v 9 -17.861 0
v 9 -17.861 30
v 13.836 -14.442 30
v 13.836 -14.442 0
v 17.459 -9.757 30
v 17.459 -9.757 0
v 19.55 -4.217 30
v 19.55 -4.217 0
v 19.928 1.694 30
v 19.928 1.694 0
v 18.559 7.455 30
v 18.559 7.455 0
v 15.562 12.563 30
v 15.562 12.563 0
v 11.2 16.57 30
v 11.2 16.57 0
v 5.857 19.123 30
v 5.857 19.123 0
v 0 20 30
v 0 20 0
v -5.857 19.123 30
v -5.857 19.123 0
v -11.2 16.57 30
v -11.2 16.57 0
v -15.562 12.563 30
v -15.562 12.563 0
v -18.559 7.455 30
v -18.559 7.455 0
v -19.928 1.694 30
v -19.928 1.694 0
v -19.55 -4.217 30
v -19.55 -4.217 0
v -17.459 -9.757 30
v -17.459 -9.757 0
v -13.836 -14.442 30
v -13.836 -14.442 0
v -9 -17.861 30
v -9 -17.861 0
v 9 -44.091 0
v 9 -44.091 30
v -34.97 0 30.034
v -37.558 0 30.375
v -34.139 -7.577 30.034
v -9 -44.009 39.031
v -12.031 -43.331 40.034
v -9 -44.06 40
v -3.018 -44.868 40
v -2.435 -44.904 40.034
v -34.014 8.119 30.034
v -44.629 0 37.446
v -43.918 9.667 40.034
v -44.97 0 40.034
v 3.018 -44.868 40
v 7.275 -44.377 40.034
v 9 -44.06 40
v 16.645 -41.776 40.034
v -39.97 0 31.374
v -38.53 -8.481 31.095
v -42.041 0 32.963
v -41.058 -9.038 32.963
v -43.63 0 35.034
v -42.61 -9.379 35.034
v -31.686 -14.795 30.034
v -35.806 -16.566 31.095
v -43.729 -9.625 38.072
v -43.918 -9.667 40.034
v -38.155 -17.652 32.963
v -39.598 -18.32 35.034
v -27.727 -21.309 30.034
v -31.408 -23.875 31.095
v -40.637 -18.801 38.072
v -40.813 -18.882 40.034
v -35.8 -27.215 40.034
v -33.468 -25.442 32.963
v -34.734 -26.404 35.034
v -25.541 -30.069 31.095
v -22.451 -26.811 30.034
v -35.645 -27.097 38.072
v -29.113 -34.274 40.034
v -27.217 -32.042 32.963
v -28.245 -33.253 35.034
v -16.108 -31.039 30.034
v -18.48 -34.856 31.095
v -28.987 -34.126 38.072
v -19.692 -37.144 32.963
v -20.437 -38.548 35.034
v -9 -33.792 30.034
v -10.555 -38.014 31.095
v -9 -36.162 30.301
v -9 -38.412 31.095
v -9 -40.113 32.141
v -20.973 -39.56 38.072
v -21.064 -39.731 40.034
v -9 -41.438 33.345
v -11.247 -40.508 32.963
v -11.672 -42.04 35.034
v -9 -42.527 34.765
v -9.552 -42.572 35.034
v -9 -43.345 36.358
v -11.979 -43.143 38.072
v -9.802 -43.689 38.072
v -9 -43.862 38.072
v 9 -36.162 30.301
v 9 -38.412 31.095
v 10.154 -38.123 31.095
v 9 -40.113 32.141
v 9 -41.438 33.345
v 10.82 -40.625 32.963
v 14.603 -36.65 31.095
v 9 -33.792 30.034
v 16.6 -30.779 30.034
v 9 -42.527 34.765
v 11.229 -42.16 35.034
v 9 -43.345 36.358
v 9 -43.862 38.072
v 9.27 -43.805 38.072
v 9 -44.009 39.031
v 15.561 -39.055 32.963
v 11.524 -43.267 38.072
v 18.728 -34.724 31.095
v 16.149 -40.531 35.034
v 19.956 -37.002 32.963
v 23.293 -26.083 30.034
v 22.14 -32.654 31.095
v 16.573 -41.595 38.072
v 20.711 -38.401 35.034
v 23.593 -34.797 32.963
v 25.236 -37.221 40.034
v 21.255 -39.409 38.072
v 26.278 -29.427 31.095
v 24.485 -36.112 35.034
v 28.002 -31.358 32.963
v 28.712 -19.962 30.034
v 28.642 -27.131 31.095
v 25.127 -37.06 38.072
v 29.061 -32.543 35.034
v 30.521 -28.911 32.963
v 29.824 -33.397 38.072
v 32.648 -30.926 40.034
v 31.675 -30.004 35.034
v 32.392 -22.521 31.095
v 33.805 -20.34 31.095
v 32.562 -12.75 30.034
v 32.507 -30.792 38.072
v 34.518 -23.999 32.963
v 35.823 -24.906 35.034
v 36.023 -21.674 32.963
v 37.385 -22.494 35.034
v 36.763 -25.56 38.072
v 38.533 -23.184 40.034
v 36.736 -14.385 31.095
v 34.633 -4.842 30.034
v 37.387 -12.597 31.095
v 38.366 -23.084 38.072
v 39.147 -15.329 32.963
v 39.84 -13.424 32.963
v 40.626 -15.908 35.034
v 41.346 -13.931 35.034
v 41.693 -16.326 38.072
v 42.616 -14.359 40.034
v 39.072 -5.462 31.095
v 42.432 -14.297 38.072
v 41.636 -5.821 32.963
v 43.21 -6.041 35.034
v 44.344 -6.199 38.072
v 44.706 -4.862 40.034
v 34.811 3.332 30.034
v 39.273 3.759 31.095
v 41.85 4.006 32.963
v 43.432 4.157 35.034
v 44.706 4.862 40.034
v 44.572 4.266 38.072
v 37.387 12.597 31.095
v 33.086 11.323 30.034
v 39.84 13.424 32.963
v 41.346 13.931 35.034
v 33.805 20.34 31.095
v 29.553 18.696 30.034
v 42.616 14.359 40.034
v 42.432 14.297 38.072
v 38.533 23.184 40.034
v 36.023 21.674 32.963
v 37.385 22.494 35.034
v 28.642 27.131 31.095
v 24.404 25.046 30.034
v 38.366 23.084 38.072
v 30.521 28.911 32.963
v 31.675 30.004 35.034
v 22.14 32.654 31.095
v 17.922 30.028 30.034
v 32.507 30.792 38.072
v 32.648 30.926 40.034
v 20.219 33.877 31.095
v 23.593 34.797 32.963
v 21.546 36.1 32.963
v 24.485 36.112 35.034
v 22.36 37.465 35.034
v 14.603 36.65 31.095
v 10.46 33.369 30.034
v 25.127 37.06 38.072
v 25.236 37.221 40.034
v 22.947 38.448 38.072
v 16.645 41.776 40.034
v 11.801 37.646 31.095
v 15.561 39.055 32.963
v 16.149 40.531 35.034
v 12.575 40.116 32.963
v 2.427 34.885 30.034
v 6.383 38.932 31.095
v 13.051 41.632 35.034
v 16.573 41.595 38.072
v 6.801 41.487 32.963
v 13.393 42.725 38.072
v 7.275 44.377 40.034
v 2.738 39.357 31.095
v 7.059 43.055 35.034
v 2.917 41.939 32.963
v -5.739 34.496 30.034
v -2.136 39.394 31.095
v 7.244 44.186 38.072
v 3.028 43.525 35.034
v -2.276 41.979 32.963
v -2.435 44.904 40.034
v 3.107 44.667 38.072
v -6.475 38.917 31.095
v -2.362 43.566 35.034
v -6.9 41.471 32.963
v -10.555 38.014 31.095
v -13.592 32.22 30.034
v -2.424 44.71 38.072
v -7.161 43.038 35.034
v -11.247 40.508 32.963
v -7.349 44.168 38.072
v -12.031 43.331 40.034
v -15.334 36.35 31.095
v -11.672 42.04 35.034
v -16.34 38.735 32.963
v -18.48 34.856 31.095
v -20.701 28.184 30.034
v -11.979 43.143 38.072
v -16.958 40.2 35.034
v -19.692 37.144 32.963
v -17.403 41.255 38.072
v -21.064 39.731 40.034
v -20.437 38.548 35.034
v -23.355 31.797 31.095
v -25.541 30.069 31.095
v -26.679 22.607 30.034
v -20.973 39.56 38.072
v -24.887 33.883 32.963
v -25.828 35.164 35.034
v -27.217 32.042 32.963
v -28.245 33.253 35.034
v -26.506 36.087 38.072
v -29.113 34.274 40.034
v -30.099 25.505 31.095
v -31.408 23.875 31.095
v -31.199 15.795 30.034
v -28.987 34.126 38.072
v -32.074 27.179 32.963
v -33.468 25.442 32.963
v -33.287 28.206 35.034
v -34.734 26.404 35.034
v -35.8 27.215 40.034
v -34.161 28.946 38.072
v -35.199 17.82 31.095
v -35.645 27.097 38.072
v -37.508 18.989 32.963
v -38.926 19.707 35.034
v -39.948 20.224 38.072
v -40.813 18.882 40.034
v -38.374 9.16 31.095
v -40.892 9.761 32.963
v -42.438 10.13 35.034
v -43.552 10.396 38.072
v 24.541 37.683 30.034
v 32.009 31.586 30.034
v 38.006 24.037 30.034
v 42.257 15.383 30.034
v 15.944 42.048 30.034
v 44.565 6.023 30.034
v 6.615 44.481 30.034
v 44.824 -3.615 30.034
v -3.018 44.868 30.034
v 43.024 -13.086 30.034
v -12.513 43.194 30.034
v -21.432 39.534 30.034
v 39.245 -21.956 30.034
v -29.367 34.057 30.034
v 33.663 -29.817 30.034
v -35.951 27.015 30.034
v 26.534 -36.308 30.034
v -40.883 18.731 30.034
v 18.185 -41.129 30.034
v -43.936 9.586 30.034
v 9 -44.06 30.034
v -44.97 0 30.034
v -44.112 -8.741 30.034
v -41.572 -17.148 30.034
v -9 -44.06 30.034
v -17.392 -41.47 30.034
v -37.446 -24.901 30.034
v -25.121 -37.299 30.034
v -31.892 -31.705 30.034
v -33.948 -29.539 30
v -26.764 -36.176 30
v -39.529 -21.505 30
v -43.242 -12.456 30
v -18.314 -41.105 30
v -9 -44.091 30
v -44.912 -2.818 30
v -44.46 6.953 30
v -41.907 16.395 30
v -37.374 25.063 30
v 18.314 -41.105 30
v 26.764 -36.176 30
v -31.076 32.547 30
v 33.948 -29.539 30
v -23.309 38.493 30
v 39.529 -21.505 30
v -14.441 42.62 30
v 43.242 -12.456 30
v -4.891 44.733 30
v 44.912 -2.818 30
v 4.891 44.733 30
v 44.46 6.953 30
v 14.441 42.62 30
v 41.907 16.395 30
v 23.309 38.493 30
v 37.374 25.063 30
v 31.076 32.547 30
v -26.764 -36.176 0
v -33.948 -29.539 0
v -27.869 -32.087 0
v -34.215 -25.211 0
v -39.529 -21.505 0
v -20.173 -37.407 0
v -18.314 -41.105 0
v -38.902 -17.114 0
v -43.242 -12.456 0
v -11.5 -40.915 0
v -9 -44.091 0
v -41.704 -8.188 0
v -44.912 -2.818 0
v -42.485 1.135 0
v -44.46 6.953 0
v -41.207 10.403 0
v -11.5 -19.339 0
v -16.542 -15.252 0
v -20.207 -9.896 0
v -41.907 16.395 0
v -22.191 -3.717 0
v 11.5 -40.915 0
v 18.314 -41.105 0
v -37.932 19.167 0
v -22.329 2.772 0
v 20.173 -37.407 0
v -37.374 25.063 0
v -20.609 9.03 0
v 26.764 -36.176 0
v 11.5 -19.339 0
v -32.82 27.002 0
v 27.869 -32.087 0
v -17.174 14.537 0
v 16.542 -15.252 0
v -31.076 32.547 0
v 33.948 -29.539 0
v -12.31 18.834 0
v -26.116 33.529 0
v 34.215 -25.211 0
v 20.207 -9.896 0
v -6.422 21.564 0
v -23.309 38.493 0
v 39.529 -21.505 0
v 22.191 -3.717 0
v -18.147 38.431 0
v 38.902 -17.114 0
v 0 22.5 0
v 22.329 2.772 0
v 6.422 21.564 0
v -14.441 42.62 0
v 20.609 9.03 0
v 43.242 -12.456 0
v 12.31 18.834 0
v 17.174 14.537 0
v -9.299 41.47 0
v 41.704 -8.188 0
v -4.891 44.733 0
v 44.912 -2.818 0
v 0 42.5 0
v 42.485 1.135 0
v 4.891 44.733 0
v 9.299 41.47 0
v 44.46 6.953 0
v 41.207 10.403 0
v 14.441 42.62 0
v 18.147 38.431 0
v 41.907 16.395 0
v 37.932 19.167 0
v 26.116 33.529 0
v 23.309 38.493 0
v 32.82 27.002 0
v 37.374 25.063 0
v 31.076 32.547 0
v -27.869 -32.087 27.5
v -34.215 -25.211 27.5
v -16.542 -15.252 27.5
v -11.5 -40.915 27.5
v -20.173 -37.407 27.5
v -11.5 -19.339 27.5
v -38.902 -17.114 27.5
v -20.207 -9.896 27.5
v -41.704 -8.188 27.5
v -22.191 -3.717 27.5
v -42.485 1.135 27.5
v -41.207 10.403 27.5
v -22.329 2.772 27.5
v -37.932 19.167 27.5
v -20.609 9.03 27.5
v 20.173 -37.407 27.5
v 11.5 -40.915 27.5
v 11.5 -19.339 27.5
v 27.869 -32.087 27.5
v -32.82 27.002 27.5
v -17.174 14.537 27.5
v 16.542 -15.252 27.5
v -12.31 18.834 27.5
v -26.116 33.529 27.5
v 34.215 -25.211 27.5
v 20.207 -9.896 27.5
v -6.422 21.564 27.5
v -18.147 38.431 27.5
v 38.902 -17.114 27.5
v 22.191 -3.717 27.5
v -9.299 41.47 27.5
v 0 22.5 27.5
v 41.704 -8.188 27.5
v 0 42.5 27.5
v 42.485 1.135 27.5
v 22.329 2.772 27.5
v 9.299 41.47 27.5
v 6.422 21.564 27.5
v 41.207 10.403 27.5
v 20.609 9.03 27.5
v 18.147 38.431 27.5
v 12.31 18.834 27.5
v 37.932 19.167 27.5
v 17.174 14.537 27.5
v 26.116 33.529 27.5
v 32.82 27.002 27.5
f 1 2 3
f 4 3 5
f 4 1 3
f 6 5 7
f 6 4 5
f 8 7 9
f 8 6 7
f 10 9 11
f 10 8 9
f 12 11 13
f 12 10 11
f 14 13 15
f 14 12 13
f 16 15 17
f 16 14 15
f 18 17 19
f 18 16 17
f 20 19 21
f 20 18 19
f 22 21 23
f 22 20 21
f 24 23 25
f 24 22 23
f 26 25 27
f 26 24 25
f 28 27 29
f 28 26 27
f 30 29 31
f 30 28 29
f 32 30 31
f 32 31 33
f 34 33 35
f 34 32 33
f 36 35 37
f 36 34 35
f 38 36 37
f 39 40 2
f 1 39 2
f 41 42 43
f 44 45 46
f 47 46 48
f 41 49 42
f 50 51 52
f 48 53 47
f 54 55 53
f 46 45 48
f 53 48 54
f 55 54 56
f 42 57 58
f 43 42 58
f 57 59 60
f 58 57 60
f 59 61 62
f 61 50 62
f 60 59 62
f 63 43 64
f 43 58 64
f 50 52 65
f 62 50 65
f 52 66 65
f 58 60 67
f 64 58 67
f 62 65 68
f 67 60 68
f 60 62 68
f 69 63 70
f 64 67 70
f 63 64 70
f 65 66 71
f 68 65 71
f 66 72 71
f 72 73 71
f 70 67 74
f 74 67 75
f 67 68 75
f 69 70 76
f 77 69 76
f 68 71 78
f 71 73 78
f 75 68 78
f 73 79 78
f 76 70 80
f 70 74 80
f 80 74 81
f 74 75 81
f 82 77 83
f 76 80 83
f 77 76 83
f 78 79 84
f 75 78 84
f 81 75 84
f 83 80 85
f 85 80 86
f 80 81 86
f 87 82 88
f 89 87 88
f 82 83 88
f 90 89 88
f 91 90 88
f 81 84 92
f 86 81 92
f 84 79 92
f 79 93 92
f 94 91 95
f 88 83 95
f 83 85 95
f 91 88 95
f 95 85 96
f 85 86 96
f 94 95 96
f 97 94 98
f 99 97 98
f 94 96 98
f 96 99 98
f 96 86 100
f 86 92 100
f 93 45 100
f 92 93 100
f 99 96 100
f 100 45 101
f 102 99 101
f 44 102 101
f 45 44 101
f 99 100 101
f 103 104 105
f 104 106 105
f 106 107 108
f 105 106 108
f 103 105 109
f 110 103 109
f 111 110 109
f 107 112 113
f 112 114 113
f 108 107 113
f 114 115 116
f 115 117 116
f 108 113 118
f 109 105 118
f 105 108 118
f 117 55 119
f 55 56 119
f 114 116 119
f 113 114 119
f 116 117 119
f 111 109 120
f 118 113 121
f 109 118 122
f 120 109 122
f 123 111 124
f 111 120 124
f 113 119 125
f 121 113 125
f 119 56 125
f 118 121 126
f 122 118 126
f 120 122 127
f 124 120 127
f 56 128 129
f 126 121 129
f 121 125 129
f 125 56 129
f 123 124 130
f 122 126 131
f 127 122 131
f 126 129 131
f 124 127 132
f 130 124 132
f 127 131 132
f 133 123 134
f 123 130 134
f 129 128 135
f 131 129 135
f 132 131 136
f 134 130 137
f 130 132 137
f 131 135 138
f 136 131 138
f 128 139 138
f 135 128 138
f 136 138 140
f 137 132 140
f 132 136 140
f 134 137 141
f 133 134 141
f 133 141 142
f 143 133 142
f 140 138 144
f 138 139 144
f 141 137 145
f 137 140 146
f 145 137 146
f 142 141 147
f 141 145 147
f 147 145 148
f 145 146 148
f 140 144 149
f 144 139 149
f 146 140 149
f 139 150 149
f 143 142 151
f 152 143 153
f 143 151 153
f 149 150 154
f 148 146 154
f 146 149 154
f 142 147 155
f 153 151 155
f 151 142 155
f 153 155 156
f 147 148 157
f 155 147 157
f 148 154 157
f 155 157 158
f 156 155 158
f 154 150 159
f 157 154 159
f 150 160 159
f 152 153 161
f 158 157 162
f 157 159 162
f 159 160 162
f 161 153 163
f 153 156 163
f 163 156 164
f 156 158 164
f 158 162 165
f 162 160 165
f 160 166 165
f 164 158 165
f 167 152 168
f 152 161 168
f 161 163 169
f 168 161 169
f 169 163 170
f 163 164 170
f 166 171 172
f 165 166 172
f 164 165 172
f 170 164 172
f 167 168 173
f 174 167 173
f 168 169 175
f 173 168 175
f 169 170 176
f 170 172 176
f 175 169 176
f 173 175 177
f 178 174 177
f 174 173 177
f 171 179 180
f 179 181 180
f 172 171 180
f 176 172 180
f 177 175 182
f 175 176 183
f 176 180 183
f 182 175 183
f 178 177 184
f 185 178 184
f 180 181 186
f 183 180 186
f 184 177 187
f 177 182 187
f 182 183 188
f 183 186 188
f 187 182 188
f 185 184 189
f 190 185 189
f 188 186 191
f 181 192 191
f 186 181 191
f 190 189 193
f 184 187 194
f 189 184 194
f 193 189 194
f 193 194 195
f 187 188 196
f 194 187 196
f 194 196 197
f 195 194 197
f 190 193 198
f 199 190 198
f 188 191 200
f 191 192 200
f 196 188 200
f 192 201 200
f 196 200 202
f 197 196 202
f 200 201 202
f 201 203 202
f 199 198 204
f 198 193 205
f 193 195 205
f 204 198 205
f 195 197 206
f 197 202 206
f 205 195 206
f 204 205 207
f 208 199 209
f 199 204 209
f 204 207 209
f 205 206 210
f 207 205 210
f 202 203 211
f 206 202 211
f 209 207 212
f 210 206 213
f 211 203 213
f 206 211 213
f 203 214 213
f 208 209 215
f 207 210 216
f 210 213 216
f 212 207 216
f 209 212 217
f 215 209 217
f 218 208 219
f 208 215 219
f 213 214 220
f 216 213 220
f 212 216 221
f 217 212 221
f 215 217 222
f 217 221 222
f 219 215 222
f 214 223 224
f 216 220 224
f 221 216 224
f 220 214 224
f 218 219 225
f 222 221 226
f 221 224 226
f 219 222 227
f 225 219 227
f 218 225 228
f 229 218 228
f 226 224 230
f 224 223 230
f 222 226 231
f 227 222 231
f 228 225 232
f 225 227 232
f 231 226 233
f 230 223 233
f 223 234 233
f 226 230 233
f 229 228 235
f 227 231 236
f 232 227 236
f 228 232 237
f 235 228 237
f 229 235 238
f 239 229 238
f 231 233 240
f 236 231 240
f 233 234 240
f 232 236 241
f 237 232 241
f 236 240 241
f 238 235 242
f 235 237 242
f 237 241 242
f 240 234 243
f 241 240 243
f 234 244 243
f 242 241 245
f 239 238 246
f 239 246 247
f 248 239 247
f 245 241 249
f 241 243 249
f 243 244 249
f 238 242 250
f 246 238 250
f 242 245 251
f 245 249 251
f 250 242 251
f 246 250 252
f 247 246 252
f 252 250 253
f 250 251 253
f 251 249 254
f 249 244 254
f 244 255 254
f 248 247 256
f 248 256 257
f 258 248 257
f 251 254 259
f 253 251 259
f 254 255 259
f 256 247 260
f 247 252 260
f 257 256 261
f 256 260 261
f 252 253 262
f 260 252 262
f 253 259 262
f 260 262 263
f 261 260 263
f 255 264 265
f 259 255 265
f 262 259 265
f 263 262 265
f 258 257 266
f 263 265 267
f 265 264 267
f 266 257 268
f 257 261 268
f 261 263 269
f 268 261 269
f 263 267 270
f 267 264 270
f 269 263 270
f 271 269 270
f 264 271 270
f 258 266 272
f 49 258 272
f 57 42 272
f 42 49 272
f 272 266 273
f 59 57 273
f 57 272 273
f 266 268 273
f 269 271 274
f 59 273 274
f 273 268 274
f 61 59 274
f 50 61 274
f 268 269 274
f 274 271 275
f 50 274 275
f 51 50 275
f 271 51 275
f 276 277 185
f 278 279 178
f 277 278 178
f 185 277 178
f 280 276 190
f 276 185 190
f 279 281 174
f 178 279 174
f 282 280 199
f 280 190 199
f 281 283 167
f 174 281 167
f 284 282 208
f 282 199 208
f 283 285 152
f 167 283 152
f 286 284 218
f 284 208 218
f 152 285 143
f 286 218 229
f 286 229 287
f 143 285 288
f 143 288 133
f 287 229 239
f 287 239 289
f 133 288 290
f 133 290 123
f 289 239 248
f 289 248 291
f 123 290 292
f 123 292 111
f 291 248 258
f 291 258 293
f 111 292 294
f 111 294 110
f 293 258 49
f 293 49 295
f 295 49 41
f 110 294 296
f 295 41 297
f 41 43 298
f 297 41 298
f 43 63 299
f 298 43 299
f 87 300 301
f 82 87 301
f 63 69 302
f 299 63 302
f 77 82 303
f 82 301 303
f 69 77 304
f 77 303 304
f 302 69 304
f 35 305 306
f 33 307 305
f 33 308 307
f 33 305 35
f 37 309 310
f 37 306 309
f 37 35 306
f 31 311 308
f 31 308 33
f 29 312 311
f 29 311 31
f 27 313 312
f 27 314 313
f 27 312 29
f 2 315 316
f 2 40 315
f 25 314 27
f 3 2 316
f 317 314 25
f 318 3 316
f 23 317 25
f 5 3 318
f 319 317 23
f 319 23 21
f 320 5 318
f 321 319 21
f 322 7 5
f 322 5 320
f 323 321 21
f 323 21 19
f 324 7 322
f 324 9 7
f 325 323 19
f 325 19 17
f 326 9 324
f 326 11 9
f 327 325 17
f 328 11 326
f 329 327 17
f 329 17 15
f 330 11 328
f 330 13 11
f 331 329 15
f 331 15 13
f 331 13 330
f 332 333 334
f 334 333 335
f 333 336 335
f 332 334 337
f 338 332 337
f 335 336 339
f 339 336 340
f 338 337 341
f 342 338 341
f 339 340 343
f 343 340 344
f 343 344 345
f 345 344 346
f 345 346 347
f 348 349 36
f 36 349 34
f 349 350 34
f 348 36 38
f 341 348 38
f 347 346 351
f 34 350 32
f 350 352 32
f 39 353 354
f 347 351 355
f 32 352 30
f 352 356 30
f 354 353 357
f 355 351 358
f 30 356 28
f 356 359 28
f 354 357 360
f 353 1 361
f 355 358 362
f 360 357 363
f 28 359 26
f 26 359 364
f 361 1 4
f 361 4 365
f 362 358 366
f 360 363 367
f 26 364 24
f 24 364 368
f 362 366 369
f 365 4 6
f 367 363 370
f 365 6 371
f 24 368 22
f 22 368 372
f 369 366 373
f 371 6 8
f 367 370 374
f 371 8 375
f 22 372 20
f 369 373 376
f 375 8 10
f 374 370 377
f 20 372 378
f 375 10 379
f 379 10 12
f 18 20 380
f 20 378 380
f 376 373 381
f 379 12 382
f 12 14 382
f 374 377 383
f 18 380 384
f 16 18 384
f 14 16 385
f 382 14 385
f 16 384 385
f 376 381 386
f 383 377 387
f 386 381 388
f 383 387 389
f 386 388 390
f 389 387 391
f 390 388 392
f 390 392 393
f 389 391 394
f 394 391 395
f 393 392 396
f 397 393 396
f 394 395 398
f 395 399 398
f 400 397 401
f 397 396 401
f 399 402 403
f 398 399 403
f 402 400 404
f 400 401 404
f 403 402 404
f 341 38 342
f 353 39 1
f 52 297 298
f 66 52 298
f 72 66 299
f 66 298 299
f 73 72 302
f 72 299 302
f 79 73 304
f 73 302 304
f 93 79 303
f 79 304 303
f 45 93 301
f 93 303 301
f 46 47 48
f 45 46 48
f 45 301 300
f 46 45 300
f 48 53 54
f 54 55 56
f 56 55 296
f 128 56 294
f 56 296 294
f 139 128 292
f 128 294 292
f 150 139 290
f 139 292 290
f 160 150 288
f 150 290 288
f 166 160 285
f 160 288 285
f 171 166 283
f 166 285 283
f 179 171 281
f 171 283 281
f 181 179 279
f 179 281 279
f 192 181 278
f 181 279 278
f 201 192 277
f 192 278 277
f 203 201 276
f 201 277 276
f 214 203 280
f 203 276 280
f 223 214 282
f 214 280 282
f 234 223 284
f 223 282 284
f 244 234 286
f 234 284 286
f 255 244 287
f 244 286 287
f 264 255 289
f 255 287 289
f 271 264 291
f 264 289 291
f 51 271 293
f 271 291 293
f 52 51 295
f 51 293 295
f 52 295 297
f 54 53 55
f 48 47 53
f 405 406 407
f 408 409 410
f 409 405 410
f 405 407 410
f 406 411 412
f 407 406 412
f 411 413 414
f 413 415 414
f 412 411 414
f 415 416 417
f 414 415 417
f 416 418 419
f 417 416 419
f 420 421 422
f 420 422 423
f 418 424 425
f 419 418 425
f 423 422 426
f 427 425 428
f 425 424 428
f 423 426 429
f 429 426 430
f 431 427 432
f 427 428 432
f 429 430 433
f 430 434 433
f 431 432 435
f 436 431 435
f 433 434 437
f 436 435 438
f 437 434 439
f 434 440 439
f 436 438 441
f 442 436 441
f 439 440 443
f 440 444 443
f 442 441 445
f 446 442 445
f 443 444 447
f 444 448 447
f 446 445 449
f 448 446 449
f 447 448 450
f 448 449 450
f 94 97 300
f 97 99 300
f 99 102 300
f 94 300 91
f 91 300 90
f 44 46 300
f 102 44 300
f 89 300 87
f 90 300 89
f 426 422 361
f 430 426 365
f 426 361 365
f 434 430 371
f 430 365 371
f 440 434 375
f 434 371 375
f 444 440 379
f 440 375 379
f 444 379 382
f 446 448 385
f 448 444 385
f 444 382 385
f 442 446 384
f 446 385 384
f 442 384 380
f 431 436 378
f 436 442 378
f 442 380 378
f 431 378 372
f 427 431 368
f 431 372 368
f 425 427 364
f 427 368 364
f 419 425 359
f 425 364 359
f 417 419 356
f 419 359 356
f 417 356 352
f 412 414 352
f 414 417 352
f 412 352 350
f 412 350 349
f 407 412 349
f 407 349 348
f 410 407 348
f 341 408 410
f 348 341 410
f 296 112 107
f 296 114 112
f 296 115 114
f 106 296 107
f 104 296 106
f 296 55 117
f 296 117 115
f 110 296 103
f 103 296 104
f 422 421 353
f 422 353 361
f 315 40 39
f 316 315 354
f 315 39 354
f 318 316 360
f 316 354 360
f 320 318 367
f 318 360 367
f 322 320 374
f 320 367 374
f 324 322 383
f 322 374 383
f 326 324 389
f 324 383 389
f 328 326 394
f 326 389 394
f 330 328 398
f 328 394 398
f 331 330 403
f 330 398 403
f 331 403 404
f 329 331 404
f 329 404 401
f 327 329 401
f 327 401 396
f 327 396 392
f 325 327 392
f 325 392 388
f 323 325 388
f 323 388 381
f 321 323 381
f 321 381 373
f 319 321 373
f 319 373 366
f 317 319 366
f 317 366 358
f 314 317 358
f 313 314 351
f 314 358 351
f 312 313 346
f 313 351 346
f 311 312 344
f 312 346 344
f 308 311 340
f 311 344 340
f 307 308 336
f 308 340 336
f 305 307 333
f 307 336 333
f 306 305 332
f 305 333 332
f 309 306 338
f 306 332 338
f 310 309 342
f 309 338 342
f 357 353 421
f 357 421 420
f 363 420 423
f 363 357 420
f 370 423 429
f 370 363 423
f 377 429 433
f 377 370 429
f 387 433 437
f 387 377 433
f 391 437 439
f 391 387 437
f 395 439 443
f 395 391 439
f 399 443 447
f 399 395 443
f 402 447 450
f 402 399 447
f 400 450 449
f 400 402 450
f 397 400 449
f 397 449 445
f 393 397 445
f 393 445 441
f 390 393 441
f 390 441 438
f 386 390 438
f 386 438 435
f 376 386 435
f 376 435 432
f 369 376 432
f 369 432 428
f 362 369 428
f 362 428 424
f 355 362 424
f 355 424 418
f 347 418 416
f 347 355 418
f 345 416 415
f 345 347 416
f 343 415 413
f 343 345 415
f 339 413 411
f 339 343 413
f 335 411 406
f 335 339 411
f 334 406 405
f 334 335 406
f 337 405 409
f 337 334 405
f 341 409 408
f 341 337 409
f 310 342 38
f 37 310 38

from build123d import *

# Parameters (mm, degrees)
F0_R      = 45
F2_DEPTH  = 30
F1_R      = 20
F3_DEPTH  = 40
F9_W      = 18
F9_H      = 58.0645236965
F10_DEPTH = 40
F11_T     = -2.5


with BuildPart() as f2:
    # F0 (on Top) → F2 (new body)
    with BuildSketch(Plane.XY):
        Circle(F0_R)
    extrude(amount=F2_DEPTH)


with BuildPart() as f3:
    # F1 (on Top) → F3 (new body)
    with BuildSketch(Plane.XY):
        Circle(F1_R)
    extrude(amount=F3_DEPTH)


with BuildPart() as f2_1:
    add(f2.part)

    # F4: cut F3
    add(f3.part, mode=Mode.SUBTRACT)


with BuildPart() as f7:
    # F5 (on Front) → F7 (revolve)
    with BuildSketch(Plane.XZ):
        with BuildLine():
            Line((-44.9697525129, 50.0337845905), (-44.9697525129, 40.0337845905))
            Line((-44.9697525129, 40.0337845905), (-34.9697525129, 40.0337845905))
            ThreePointArc((-34.9697525129, 40.0337845905), (-42.0408203248, 42.9627167786), (-44.9697525129, 50.0337845905))
        make_face()
    revolve(axis=Axis((0, 0, 0), (0, 0, 1)))


with BuildPart() as f7_1:
    # F8: moved
    add(f7.part.moved(Location((0, 0, -10))))


with BuildPart() as f10_tool:
    # F9 (on Top) → F10 (new body)
    with BuildSketch(Plane.XY):
        with Locations((0, -42.677423591)):
            Rectangle(F9_W, F9_H)
    extrude(amount=F10_DEPTH)


with BuildPart() as f2_2:
    add(f2_1.part)

    # F10: cut by f10_tool
    add(f10_tool.part, mode=Mode.SUBTRACT)

    # F11
    f11_openings = [f2_2.faces().sort_by_distance(p)[0] for p in [
        (0, 43.73362, 0),
    ]]
    offset(amount=F11_T, openings=f11_openings)


with BuildPart() as f7_2:
    add(f7_1.part)

    # F10: cut by f10_tool
    add(f10_tool.part, mode=Mode.SUBTRACT)


solid = Compound([f2_2.part, f7_2.part])
